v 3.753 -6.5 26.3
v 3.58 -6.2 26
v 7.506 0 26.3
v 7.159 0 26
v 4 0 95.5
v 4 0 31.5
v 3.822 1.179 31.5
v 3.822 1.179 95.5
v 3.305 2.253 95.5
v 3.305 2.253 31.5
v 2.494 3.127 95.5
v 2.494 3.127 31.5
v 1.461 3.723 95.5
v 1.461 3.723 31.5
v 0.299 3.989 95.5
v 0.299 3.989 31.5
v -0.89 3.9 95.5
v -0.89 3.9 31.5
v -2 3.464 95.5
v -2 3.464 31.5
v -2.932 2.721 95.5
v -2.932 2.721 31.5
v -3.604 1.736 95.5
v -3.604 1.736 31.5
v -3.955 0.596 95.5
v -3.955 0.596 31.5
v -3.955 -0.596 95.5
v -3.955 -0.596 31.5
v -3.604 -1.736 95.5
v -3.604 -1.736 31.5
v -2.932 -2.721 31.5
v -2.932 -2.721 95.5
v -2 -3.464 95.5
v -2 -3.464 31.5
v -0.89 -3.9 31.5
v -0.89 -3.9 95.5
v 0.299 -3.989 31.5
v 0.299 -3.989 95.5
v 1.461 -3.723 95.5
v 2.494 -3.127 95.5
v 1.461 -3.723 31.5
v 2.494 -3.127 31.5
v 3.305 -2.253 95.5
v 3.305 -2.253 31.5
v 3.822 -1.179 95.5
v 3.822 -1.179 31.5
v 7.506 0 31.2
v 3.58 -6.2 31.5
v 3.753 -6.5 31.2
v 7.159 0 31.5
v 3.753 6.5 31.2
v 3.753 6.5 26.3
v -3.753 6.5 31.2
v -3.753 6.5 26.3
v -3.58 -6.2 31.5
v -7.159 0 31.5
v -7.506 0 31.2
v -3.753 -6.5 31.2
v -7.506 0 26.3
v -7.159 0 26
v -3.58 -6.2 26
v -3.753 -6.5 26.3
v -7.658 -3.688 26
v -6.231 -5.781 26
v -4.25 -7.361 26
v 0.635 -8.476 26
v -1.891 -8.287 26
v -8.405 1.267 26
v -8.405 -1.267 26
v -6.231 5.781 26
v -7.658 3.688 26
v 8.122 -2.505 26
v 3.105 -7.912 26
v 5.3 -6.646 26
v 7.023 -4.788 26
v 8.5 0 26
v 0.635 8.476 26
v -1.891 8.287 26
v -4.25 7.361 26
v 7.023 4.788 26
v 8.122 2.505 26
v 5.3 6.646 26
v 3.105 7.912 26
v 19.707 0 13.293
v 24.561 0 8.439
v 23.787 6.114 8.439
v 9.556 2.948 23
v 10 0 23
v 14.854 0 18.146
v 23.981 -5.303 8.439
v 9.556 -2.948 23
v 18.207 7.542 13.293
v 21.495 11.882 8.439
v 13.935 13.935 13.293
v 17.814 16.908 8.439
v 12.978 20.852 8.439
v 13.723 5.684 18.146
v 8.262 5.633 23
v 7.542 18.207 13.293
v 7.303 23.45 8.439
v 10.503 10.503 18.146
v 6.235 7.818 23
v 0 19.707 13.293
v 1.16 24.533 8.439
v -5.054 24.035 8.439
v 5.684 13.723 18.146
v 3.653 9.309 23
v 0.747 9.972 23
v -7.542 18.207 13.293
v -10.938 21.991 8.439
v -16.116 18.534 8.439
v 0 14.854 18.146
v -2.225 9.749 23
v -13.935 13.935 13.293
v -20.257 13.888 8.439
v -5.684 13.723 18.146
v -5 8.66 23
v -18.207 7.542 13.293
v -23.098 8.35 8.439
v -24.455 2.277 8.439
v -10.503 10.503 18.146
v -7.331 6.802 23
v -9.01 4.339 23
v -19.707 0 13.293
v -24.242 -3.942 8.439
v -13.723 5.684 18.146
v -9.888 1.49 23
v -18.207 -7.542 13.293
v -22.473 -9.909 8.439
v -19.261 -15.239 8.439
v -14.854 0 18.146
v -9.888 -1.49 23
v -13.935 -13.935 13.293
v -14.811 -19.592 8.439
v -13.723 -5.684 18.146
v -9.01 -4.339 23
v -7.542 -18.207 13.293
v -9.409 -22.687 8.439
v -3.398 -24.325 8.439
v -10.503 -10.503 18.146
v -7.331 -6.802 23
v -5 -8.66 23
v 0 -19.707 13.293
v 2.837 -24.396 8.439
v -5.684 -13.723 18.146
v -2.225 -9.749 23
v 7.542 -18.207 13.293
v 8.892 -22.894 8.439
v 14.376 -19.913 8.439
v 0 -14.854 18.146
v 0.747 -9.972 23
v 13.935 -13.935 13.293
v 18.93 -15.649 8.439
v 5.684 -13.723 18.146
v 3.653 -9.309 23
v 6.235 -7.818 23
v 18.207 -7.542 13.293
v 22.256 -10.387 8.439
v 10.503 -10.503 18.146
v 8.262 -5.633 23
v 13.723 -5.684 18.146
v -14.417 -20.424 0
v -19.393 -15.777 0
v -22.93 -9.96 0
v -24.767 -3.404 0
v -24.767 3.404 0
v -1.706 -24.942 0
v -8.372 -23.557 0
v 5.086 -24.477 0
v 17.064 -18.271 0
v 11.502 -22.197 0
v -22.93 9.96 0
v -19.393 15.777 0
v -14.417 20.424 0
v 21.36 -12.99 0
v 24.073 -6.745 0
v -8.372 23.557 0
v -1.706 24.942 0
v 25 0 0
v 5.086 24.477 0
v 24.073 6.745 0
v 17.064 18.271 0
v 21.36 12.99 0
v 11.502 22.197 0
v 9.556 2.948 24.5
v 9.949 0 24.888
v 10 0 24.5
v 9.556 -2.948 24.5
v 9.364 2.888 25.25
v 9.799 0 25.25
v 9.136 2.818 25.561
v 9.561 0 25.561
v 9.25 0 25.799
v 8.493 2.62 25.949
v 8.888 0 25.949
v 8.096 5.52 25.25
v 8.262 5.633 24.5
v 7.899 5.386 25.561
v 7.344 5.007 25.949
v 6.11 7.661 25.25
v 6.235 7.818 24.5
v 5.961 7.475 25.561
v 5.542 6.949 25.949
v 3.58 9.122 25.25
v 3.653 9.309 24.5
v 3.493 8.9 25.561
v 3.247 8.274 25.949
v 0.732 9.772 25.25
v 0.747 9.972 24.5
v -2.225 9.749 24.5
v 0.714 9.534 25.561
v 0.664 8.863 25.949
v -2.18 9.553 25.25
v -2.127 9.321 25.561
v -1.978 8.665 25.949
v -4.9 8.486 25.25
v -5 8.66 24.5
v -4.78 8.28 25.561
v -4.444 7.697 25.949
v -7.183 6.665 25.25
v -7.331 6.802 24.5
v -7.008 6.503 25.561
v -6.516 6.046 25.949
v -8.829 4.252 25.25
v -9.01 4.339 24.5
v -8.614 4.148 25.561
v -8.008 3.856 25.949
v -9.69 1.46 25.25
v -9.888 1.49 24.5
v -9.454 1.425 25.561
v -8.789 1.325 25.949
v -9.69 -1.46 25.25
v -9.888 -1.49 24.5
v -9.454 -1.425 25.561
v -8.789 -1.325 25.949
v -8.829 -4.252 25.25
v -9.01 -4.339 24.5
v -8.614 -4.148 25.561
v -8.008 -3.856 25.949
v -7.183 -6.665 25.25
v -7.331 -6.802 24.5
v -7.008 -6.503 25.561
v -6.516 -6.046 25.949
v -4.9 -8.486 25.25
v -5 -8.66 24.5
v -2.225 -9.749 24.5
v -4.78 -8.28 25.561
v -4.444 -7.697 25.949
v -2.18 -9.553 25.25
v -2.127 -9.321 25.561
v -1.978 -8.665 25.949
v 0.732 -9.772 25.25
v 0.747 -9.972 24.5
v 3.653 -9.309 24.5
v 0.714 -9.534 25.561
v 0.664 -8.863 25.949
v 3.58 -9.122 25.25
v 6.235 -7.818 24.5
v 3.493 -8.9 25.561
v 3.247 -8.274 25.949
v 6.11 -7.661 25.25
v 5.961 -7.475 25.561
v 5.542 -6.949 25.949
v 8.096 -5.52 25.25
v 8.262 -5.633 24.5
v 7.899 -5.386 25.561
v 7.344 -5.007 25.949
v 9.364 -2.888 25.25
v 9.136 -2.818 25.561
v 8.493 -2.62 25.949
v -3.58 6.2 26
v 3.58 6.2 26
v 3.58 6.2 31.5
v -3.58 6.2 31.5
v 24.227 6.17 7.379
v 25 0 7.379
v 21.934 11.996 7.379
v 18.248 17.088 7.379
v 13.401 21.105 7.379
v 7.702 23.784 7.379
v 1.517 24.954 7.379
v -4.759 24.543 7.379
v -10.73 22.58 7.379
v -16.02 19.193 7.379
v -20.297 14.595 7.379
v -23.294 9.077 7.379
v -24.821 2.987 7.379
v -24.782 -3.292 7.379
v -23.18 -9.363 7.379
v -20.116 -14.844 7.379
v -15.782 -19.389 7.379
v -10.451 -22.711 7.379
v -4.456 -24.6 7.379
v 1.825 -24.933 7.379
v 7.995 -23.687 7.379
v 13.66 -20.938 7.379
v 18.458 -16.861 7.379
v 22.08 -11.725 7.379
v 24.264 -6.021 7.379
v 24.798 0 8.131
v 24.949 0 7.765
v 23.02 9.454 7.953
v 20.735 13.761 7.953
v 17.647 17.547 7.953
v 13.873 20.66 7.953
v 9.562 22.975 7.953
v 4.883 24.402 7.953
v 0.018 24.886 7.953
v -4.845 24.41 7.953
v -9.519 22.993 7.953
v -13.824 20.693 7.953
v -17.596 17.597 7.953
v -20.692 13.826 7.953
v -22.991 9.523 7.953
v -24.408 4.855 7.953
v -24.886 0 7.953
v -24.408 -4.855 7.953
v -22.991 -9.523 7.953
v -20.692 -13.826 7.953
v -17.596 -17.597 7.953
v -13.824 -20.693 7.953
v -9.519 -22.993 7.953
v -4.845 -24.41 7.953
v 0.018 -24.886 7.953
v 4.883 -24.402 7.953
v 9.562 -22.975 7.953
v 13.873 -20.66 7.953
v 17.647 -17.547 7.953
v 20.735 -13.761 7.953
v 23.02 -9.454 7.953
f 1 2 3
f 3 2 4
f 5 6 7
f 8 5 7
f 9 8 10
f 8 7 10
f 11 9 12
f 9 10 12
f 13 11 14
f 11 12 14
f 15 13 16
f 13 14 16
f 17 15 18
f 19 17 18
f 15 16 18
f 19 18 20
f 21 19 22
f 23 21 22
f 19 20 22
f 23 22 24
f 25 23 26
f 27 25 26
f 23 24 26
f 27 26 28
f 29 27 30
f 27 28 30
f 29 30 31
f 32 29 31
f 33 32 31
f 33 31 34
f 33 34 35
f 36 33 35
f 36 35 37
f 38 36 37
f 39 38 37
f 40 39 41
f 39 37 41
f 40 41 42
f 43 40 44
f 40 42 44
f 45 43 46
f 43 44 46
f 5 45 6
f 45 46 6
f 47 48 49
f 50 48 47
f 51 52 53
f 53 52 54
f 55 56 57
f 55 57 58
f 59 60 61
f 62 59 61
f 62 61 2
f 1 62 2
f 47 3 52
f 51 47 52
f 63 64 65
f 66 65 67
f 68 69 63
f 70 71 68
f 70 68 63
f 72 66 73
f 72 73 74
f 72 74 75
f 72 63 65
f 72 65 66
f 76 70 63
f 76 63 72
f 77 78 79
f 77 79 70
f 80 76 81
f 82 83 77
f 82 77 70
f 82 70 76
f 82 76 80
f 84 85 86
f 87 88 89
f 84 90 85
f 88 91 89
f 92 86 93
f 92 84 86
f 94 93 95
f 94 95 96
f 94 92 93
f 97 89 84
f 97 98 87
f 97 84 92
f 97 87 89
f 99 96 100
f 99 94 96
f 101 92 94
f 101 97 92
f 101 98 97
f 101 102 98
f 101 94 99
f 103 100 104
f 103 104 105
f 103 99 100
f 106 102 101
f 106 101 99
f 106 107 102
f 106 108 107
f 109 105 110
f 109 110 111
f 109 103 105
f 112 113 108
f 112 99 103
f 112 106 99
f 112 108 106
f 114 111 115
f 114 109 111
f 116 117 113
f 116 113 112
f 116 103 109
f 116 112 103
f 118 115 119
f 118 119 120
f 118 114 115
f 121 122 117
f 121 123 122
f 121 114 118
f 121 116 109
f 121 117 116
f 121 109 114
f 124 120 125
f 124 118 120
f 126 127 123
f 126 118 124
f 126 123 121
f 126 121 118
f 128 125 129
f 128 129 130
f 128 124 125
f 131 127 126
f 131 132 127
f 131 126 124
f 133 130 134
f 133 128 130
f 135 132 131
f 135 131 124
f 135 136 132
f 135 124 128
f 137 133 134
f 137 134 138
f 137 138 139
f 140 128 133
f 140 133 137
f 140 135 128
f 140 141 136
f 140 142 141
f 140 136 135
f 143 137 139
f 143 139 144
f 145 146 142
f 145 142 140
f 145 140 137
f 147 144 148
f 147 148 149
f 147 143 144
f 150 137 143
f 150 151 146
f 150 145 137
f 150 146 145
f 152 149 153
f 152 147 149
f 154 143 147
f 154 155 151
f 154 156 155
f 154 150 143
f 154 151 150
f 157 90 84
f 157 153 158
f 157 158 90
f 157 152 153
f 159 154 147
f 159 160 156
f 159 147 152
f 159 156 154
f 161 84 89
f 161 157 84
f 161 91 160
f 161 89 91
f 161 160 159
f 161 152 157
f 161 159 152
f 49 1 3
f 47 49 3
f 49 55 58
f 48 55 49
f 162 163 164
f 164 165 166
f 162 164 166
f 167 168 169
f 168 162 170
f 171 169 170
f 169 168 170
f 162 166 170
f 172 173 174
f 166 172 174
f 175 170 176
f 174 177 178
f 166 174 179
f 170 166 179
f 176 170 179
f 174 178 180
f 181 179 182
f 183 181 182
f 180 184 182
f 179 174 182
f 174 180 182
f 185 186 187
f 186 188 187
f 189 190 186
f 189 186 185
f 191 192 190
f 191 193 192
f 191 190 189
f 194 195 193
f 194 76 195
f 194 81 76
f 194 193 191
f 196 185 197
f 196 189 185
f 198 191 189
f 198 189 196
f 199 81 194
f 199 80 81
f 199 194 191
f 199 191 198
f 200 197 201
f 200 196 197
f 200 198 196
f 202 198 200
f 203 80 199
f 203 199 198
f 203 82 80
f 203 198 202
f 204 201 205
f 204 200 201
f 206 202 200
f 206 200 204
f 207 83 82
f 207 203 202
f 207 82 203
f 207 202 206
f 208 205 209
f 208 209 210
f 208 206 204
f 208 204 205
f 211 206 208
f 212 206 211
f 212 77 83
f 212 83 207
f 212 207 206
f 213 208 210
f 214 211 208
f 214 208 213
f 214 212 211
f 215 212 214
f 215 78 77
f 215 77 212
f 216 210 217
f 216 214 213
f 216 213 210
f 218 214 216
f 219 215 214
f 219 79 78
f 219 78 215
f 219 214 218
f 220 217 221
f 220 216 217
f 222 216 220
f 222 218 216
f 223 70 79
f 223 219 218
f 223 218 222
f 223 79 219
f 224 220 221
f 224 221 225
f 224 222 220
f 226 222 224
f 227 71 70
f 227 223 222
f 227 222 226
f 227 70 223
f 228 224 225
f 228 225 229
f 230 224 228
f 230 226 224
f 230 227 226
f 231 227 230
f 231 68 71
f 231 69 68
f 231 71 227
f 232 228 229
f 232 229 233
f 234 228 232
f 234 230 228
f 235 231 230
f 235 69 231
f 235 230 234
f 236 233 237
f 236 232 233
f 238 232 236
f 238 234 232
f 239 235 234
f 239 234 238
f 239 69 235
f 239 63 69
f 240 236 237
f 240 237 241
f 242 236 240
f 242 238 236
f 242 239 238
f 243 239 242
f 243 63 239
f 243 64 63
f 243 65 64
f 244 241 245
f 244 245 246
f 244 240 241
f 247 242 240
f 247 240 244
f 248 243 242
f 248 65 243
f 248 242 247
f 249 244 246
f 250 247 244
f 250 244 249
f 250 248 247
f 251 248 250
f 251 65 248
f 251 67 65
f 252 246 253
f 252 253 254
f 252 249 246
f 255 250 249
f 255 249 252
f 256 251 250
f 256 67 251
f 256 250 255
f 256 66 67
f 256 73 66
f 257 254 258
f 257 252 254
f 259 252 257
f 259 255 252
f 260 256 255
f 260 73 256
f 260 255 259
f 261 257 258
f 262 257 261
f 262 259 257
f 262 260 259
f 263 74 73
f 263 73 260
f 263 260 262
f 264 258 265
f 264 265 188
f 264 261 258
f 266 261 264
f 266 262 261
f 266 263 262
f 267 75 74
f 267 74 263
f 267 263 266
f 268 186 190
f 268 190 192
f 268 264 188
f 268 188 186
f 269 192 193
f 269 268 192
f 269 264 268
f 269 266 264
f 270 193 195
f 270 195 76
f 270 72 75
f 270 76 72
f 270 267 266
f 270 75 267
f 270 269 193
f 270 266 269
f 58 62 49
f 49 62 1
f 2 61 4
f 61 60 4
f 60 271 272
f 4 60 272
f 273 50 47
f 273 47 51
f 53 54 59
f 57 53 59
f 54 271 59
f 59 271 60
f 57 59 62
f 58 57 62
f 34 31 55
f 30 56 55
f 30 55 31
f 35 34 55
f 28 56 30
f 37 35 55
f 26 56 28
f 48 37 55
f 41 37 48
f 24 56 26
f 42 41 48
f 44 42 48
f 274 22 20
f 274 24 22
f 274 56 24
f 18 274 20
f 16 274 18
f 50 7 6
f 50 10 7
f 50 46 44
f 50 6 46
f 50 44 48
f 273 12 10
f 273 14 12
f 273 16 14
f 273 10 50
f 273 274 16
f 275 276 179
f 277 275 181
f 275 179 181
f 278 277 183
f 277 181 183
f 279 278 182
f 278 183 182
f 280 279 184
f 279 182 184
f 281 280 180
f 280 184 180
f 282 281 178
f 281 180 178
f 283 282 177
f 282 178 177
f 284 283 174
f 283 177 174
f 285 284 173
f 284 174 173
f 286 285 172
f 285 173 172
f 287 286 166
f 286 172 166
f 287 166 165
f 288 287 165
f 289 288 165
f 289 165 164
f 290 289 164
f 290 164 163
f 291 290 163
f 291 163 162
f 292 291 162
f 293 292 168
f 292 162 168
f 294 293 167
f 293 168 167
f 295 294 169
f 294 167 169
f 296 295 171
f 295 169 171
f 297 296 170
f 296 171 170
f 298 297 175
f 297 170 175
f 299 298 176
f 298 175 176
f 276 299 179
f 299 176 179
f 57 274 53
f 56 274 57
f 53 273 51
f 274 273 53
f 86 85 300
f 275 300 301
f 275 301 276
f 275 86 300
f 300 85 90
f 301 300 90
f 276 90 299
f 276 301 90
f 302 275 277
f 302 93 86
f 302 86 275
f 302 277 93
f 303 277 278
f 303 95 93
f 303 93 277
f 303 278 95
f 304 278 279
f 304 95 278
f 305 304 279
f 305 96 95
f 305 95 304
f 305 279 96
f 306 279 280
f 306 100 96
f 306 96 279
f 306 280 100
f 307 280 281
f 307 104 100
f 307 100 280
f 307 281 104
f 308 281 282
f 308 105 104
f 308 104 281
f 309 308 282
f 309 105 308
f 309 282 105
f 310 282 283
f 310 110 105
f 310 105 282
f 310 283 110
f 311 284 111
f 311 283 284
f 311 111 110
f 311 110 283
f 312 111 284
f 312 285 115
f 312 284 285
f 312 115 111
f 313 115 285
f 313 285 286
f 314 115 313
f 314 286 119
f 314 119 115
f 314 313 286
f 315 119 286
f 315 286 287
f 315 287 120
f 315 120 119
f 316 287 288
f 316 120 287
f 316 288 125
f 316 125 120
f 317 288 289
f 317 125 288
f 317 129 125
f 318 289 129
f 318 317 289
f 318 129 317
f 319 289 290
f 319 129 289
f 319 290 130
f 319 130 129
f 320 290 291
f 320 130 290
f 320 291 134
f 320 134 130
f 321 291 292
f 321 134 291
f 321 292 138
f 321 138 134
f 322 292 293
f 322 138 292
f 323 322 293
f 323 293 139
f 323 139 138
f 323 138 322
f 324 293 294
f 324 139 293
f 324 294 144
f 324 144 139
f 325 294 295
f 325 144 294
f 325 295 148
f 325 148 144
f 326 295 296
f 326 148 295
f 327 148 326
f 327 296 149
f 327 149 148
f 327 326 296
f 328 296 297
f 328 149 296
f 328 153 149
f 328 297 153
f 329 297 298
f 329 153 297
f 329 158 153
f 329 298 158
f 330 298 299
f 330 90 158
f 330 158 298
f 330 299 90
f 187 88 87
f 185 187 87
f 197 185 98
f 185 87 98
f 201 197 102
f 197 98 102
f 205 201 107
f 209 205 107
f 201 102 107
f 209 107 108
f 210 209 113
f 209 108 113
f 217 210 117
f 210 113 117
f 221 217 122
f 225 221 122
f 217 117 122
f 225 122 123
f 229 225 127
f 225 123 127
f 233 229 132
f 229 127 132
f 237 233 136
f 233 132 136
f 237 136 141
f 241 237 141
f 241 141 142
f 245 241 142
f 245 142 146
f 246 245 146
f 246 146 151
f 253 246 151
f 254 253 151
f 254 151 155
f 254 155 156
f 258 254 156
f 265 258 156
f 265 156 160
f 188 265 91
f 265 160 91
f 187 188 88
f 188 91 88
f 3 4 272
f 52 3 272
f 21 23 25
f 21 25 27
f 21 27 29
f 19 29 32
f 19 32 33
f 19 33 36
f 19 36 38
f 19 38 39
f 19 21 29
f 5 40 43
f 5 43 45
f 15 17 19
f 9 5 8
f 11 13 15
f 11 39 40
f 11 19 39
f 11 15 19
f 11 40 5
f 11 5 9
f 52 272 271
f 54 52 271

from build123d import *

# Parameters (mm, degrees)
SKETCH_R        = 25
PAD_DEPTH       = 23
CHAMFER_SIZE    = 15
SKETCH001_R     = 10
PAD001_DEPTH    = 3
FILLET_R        = 1.5
PAD002_DEPTH    = 5.5
CHAMFER001_SIZE = 0.3
SKETCH003_R     = 4
PAD003_DEPTH    = 64


with BuildPart() as body:
    # Sketch → Pad (new body)
    with BuildSketch(Plane.XY):
        Circle(SKETCH_R)
    extrude(amount=PAD_DEPTH)

    # Chamfer
    chamfer_edges = [body.edges().sort_by_distance(p)[0] for p in [
        (-25, 0, 23),
    ]]
    chamfer(chamfer_edges, length=CHAMFER_SIZE)

    # Sketch001 (on Face4 of Chamfer) → Pad001 (join)
    with BuildSketch(Plane.XY.offset(23)):
        Circle(SKETCH001_R)
    extrude(amount=PAD001_DEPTH)

    # Fillet
    fillet_edges = [body.edges().sort_by_distance(p)[0] for p in [
        (-10, 0, 26),
        (-25, 0, 8),
    ]]
    fillet(fillet_edges, radius=FILLET_R)


with BuildPart() as body001:
    # Sketch002 (on Face1 of CopyFillet) → Pad002 (new body)
    with BuildSketch(Plane.XY.offset(26)):
        Polygon((7.505553, 0), (3.752777, 6.5), (-3.752777, 6.5), (-7.505553, 0), (-3.752777, -6.5), (3.752777, -6.5), align=None)
    extrude(amount=PAD002_DEPTH)

    # Chamfer001
    chamfer001_edges = [body001.edges().sort_by_distance(p)[0] for p in [
        (5.629165, -3.25, 31.5),
        (5.629165, 3.25, 31.5),
        (0, 6.5, 31.5),
        (-5.629165, 3.25, 31.5),
        (-5.629165, -3.25, 31.5),
        (0, -6.5, 31.5),
        (0, -6.5, 26),
        (-5.629165, -3.25, 26),
        (-5.629165, 3.25, 26),
        (0, 6.5, 26),
        (5.629165, 3.25, 26),
        (5.629165, -3.25, 26),
    ]]
    chamfer(chamfer001_edges, length=CHAMFER001_SIZE)

    # Sketch003 (on Face11 of Chamfer001) → Pad003 (join)
    with BuildSketch(Plane.XY.offset(31.5)):
        Circle(SKETCH003_R)
    extrude(amount=PAD003_DEPTH)


solid = Compound([body.part, body001.part])
